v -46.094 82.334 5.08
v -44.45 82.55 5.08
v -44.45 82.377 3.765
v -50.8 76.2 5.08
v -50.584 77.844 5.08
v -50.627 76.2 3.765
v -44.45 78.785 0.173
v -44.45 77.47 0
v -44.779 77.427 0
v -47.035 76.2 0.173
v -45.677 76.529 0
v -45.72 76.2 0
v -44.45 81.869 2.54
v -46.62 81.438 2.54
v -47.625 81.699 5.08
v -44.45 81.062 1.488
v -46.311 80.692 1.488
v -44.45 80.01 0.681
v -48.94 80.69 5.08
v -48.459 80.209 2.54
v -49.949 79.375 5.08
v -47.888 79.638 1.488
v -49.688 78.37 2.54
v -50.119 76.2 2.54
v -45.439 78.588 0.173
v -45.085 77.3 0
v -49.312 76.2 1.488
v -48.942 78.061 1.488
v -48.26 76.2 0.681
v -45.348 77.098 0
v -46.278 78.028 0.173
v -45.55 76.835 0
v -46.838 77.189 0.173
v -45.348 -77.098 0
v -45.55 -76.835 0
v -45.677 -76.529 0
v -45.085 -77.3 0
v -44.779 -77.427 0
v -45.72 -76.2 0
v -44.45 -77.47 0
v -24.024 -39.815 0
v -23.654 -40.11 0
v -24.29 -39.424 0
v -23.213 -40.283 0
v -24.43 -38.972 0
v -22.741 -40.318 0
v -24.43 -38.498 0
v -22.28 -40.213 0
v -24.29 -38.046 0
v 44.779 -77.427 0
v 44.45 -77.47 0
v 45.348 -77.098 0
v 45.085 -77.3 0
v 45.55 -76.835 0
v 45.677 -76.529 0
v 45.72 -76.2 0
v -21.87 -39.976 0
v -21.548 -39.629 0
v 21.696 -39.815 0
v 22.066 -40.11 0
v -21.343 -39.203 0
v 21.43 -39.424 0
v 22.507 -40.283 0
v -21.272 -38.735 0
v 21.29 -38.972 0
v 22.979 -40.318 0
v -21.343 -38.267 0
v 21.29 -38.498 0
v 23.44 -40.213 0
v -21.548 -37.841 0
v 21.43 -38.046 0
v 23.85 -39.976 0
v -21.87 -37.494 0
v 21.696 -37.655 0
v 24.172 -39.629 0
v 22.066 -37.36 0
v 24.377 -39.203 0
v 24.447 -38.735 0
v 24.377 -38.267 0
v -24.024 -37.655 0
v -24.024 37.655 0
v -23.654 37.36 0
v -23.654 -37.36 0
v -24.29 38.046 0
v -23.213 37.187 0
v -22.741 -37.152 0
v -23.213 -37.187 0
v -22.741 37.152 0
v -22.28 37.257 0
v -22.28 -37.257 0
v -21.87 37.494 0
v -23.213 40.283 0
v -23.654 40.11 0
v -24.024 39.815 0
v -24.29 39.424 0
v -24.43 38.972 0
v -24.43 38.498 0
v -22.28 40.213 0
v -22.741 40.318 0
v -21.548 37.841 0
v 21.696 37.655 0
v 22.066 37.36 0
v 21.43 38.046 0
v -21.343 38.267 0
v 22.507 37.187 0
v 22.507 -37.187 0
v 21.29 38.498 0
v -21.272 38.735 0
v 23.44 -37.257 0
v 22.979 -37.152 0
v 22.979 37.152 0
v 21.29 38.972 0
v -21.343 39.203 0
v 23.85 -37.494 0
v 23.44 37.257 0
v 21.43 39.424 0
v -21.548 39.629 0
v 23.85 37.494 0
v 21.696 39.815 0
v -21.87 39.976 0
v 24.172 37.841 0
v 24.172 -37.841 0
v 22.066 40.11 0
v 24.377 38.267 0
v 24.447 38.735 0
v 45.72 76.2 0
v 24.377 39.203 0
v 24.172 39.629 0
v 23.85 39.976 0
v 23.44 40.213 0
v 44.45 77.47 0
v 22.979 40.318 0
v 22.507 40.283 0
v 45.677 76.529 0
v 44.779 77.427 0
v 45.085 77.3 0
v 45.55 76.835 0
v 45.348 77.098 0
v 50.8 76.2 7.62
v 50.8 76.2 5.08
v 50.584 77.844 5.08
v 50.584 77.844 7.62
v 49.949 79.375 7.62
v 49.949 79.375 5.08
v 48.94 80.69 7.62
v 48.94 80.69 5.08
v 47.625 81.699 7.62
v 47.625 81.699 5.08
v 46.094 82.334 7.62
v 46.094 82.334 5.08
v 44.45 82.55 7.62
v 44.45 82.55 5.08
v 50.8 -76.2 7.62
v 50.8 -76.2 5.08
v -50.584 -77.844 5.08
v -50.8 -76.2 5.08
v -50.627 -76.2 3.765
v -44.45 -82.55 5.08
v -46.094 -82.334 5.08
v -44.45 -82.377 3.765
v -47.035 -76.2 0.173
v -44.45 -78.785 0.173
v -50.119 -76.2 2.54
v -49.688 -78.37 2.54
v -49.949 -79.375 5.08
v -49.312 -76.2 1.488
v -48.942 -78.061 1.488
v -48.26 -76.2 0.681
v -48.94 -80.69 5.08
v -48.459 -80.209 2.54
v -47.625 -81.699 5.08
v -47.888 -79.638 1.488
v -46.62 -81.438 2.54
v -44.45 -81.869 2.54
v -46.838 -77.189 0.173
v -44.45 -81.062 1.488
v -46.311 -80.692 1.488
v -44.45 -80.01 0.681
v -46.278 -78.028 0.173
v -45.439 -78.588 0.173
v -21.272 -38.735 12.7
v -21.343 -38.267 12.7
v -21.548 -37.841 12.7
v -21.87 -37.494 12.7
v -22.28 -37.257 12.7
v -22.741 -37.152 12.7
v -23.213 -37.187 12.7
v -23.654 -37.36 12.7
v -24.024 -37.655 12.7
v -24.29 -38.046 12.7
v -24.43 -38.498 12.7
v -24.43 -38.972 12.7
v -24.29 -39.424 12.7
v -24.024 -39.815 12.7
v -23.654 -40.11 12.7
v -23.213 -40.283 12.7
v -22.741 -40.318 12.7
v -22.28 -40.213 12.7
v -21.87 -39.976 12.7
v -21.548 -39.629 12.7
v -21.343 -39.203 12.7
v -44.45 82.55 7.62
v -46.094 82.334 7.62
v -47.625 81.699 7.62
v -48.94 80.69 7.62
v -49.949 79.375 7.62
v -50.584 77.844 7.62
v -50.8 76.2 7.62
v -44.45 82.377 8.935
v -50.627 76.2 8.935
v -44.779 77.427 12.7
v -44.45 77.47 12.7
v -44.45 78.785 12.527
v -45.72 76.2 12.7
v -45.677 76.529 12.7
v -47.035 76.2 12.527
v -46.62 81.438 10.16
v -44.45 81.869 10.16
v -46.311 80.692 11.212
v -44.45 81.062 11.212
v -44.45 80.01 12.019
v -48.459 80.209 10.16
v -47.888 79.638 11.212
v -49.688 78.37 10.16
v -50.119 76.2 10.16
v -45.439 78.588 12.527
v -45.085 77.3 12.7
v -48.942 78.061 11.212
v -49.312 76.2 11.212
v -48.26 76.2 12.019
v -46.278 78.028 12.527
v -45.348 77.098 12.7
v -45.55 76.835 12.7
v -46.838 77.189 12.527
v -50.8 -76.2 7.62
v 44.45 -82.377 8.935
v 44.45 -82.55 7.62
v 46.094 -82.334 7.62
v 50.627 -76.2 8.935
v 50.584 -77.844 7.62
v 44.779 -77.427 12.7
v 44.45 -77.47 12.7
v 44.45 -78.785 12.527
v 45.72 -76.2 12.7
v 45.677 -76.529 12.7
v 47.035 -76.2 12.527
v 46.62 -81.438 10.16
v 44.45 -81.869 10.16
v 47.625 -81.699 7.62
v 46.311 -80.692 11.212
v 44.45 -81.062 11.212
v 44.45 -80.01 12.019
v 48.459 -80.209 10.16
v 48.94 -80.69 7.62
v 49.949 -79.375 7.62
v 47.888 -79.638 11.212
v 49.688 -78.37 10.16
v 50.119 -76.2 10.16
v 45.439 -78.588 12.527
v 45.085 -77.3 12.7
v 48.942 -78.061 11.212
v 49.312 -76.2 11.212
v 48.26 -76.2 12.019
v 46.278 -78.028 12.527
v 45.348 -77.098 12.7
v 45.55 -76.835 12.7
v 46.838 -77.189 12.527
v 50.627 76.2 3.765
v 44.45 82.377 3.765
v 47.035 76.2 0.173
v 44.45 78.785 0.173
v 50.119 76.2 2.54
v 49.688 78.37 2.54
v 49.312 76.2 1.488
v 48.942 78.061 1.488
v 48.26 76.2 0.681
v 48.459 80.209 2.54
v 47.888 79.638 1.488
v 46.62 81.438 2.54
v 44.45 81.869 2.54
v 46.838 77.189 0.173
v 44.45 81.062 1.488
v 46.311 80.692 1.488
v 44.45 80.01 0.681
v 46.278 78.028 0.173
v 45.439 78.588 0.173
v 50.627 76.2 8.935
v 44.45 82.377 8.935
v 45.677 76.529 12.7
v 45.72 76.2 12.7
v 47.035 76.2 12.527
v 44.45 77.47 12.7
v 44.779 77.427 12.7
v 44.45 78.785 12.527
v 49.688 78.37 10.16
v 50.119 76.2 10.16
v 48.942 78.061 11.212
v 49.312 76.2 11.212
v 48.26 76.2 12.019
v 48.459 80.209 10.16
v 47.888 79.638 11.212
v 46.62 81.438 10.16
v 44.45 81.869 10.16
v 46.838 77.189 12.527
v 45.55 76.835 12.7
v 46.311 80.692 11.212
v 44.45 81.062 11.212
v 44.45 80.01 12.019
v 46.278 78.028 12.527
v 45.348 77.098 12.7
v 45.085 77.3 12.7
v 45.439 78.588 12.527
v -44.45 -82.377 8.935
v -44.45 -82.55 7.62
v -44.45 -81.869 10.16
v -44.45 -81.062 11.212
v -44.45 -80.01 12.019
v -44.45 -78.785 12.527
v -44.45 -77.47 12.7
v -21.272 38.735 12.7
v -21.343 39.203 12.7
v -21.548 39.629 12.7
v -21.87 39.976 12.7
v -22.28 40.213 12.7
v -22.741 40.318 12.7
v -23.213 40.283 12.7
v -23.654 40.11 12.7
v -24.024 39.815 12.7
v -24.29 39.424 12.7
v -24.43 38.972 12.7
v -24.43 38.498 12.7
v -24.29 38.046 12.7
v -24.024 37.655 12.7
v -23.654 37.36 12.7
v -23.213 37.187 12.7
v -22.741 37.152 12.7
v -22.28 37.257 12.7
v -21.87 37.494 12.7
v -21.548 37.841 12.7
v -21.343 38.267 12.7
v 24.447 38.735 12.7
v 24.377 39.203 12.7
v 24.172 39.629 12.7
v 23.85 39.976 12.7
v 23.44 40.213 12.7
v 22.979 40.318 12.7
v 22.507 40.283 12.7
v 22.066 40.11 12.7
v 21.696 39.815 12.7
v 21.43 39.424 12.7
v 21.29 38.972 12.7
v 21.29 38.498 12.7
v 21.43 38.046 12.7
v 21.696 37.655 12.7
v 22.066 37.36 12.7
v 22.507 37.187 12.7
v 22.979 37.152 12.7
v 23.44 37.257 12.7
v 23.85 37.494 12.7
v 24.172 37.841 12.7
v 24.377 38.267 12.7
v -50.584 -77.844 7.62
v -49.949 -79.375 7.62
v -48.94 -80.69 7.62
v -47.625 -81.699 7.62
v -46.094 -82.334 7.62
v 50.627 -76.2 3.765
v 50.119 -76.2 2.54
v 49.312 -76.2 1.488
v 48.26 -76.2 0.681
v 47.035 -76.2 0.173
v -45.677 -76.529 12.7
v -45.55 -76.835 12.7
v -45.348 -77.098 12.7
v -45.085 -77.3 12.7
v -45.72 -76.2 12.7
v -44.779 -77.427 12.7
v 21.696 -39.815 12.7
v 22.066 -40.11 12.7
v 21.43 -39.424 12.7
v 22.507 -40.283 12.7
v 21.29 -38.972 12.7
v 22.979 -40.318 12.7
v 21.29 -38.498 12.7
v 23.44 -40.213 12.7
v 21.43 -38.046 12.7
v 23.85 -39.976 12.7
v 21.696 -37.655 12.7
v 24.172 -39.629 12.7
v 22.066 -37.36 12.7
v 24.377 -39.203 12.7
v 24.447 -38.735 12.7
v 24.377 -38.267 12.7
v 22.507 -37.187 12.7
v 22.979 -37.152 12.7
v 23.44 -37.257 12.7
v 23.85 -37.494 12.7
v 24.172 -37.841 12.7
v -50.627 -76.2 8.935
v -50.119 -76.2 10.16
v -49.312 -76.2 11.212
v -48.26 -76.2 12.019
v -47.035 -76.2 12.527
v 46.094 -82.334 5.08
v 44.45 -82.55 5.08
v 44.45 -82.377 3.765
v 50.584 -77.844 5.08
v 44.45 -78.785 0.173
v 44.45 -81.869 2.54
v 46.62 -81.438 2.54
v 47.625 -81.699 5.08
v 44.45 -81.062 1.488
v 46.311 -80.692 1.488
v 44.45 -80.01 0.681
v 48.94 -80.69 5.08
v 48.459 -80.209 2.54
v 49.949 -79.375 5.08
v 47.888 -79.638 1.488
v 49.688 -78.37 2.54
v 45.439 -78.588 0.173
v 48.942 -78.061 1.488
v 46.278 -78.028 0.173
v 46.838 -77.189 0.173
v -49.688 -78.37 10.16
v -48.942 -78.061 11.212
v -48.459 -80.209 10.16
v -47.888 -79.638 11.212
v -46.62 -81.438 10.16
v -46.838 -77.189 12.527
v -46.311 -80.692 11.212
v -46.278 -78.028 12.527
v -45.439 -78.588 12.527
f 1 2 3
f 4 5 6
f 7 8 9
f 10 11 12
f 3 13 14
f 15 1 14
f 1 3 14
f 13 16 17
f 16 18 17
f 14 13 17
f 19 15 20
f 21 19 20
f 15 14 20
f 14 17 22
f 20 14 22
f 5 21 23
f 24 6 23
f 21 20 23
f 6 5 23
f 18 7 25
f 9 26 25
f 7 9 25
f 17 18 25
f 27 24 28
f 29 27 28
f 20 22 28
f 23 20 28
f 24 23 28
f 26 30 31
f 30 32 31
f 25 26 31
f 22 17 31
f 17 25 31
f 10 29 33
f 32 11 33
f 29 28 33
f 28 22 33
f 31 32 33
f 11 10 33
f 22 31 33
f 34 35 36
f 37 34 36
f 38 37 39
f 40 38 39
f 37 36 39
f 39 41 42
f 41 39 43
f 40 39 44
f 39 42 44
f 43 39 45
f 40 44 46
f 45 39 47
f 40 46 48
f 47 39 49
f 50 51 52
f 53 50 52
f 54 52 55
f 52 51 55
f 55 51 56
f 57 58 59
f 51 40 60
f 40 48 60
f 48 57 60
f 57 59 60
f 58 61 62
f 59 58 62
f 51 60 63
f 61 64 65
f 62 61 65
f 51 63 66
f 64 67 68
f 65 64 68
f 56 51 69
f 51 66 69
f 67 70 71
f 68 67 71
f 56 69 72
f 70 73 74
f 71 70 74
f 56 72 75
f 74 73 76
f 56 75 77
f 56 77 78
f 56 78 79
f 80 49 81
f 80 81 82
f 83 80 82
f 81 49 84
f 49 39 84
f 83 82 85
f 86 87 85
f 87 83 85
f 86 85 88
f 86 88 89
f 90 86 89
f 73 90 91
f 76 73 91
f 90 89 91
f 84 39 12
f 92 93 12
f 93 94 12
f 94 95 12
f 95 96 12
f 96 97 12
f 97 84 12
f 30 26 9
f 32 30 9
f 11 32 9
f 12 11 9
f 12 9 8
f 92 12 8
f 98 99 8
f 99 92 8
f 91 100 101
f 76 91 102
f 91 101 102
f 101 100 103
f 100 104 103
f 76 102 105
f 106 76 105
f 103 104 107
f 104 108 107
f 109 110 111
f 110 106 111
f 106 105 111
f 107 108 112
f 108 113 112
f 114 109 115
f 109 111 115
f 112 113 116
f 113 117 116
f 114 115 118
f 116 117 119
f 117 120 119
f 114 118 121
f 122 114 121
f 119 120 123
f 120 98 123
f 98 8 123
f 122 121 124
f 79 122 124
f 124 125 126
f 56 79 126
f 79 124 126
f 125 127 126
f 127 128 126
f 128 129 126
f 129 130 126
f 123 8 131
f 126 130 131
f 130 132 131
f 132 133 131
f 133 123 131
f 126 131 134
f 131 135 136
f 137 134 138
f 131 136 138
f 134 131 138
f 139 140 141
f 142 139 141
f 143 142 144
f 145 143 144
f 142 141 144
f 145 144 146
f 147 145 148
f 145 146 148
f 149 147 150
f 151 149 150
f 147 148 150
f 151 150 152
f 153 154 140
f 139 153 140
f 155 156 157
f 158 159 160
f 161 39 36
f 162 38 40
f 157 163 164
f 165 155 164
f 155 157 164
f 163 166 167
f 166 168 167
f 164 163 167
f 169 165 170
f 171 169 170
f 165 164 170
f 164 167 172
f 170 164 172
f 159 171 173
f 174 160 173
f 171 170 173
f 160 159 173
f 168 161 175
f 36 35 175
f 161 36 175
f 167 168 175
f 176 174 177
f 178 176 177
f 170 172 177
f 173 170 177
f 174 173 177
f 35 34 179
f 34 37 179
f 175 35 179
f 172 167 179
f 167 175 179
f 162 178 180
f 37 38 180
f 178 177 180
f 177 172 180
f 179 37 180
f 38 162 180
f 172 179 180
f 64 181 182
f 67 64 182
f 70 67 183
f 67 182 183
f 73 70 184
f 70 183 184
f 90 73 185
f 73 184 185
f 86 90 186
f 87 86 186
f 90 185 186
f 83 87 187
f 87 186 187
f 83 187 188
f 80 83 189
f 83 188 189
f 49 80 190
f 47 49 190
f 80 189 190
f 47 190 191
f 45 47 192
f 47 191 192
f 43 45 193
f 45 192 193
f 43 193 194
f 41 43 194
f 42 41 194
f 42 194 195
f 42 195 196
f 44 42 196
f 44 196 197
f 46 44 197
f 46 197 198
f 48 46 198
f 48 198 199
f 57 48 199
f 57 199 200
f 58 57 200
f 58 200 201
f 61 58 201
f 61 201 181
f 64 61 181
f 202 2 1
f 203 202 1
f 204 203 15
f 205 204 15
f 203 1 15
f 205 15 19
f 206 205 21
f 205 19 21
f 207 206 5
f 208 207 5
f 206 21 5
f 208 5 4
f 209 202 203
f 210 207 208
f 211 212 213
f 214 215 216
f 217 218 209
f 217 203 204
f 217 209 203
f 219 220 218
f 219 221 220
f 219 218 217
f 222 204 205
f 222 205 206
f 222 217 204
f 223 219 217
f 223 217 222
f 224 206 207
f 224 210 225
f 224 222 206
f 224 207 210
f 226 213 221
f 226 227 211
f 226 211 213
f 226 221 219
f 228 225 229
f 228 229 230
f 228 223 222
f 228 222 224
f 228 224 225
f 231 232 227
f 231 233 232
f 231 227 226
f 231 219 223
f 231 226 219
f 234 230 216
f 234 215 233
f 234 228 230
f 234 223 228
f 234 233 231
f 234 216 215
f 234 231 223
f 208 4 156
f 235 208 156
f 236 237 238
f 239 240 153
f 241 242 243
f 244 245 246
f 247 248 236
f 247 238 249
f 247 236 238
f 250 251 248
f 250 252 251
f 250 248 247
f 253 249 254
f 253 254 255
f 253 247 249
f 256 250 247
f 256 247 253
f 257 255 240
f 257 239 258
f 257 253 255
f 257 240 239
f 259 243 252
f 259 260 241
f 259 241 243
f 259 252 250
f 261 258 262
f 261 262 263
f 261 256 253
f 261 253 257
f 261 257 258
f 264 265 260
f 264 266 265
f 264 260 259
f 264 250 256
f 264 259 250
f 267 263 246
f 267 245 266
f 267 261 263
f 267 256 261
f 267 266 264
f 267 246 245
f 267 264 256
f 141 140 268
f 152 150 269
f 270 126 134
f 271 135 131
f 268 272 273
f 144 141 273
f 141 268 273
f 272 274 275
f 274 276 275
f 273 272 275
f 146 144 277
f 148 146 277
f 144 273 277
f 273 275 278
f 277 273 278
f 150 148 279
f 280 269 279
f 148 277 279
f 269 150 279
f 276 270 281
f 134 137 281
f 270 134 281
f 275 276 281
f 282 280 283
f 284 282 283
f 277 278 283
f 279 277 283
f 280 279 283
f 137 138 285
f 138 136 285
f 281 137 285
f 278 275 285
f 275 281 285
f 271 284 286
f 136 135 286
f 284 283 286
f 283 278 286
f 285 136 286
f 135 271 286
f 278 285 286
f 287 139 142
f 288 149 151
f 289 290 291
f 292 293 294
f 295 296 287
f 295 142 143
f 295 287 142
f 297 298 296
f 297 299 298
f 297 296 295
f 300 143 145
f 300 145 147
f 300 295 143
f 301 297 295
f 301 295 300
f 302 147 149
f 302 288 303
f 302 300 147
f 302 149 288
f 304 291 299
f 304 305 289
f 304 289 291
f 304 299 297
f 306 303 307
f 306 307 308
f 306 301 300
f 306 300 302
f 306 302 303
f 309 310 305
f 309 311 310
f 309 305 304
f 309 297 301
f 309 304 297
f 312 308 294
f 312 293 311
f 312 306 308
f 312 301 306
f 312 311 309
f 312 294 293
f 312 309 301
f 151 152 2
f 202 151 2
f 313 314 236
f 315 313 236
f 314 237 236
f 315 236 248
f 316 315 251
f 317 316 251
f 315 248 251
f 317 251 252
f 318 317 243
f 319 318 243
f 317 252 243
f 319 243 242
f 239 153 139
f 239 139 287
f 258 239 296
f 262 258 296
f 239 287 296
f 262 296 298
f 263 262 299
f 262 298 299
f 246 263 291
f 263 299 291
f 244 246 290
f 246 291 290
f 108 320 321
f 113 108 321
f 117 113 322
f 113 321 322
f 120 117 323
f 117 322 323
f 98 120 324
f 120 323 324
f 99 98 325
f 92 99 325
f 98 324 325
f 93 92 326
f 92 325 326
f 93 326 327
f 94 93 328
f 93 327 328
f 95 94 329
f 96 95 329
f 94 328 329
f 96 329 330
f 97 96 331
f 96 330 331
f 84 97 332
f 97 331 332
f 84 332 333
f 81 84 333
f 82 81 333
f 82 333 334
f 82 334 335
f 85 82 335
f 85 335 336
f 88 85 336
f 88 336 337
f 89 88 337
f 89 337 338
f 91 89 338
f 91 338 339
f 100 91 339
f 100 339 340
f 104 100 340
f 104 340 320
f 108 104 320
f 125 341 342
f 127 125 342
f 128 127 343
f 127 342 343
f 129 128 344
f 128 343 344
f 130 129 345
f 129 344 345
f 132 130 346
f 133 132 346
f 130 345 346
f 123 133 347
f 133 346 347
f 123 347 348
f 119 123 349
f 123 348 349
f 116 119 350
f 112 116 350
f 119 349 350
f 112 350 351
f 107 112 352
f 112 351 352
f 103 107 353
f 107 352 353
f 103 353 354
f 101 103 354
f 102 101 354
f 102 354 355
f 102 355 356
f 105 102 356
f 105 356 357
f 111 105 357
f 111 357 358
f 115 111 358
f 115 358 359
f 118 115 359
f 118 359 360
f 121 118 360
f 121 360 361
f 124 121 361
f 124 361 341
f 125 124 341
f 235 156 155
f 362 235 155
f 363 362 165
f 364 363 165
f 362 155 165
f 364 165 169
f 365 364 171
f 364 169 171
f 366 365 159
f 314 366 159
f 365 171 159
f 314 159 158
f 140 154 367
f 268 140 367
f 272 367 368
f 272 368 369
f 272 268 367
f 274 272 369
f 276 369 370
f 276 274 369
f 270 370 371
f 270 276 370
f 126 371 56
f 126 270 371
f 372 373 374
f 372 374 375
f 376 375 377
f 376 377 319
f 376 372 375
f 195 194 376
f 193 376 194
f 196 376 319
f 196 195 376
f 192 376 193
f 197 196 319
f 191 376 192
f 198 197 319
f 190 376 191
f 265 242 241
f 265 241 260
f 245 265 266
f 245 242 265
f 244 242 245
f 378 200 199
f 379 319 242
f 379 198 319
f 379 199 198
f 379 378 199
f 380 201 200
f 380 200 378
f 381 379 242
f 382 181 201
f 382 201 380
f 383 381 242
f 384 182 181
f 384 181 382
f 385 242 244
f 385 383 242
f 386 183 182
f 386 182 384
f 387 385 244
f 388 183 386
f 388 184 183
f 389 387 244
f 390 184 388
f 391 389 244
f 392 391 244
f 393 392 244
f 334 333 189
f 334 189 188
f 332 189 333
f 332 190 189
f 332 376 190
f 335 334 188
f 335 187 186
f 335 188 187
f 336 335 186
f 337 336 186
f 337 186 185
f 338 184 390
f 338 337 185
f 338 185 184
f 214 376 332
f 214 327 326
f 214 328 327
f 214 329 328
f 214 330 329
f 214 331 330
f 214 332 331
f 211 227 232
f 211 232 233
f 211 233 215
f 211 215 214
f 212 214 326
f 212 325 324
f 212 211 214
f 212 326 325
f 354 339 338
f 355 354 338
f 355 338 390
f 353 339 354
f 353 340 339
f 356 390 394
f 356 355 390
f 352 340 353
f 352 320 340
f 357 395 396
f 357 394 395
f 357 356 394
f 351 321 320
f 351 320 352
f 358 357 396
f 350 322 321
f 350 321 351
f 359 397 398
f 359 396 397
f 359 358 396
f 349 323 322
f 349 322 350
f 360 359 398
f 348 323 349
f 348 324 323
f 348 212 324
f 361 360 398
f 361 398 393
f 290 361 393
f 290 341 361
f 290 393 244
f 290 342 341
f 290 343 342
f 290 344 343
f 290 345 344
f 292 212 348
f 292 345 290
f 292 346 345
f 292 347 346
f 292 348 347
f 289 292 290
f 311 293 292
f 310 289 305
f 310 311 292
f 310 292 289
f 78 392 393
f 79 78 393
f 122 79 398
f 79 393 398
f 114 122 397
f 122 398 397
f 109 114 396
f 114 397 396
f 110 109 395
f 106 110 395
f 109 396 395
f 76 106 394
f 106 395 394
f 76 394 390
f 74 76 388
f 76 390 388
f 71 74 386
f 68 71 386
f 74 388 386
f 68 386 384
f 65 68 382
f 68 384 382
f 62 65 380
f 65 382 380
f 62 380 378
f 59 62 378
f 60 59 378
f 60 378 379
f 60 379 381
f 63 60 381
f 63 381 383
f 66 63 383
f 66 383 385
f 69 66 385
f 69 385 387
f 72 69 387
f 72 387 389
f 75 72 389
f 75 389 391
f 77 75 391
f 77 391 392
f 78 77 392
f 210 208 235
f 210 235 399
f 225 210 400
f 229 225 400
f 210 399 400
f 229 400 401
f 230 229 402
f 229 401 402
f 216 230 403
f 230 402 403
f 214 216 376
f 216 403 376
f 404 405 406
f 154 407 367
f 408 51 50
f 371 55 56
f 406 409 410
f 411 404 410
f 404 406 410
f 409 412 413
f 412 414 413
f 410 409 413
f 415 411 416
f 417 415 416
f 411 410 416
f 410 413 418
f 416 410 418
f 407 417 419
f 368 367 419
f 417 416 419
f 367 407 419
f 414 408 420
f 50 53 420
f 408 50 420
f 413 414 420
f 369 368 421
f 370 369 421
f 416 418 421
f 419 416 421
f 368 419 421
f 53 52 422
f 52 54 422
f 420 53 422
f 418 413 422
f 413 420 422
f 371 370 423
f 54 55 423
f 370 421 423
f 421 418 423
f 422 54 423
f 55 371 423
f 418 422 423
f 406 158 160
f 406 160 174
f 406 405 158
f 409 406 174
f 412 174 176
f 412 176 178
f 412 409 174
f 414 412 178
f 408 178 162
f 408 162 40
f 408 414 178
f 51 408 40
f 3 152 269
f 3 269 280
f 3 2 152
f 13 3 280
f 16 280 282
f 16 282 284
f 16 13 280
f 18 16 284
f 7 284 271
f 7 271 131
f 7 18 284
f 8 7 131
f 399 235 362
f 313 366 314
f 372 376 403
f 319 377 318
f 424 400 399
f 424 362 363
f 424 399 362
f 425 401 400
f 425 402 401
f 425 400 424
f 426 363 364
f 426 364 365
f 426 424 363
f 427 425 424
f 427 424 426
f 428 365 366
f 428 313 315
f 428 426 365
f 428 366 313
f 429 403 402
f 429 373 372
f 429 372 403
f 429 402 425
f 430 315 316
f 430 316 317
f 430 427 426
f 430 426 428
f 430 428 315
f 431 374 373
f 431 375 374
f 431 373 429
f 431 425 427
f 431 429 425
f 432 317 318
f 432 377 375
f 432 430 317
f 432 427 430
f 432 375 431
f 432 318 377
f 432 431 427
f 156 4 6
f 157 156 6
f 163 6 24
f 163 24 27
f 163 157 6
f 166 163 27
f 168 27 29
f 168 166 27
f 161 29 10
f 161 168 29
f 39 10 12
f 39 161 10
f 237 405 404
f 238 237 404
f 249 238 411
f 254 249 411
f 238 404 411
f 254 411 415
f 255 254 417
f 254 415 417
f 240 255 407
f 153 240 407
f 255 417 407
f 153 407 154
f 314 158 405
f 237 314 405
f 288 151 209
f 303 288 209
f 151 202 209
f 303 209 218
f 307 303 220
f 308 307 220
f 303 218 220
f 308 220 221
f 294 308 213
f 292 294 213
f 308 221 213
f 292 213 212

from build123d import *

# Parameters (mm, degrees)
F1_DEPTH = 12.7
F2_R     = 5.08
F3_R     = 1.5875
F4_DEPTH = 12.701


with BuildPart() as f1:
    # F0 (on Top) → F1 (new body)
    with BuildSketch(Plane.XY):
        with BuildLine():
            ThreePointArc((50.8, 76.2), (48.940128, 80.690128), (44.45, 82.55))
            Line((44.45, 82.55), (-44.45, 82.55))
            ThreePointArc((-44.45, 82.55), (-48.940128, 80.690128), (-50.8, 76.2))
            Line((-50.8, 76.2), (-50.8, -76.2))
            ThreePointArc((-50.8, -76.2), (-48.940128, -80.690128), (-44.45, -82.55))
            Line((-44.45, -82.55), (44.45, -82.55))
            ThreePointArc((44.45, -82.55), (48.940128, -80.690128), (50.8, -76.2))
            Line((50.8, -76.2), (50.8, 76.2))
        make_face()
    extrude(amount=F1_DEPTH)

    # F2
    f2_edges = [f1.edges().sort_by_distance(p)[0] for p in [
        (48.940128, 80.690128, 12.7),
        (0, 82.55, 12.7),
        (-48.940128, 80.690128, 12.7),
        (-50.8, 0, 12.7),
        (-48.940128, -80.690128, 12.7),
        (0, -82.55, 12.7),
        (48.940128, -80.690128, 12.7),
        (50.8, 0, 12.7),
        (48.940128, 80.690128, 0),
        (0, 82.55, 0),
        (-48.940128, 80.690128, 0),
        (-50.8, 0, 0),
        (-48.940128, -80.690128, 0),
        (0, -82.55, 0),
        (48.940128, -80.690128, 0),
        (50.8, 0, 0),
    ]]
    fillet(f2_edges, radius=F2_R)

    # F3 (on face) → F4 (cut, through all)
    with BuildSketch(Plane.XY.offset(12.7)):
        with Locations((-22.86, 38.735)):
            Circle(F3_R)
        with Locations((22.86, 38.735)):
            Circle(F3_R)
        with Locations((-22.86, -38.735)):
            Circle(F3_R)
        with Locations((22.86, -38.735)):
            Circle(F3_R)
    extrude(amount=-F4_DEPTH, mode=Mode.SUBTRACT)


solid = f1.part
